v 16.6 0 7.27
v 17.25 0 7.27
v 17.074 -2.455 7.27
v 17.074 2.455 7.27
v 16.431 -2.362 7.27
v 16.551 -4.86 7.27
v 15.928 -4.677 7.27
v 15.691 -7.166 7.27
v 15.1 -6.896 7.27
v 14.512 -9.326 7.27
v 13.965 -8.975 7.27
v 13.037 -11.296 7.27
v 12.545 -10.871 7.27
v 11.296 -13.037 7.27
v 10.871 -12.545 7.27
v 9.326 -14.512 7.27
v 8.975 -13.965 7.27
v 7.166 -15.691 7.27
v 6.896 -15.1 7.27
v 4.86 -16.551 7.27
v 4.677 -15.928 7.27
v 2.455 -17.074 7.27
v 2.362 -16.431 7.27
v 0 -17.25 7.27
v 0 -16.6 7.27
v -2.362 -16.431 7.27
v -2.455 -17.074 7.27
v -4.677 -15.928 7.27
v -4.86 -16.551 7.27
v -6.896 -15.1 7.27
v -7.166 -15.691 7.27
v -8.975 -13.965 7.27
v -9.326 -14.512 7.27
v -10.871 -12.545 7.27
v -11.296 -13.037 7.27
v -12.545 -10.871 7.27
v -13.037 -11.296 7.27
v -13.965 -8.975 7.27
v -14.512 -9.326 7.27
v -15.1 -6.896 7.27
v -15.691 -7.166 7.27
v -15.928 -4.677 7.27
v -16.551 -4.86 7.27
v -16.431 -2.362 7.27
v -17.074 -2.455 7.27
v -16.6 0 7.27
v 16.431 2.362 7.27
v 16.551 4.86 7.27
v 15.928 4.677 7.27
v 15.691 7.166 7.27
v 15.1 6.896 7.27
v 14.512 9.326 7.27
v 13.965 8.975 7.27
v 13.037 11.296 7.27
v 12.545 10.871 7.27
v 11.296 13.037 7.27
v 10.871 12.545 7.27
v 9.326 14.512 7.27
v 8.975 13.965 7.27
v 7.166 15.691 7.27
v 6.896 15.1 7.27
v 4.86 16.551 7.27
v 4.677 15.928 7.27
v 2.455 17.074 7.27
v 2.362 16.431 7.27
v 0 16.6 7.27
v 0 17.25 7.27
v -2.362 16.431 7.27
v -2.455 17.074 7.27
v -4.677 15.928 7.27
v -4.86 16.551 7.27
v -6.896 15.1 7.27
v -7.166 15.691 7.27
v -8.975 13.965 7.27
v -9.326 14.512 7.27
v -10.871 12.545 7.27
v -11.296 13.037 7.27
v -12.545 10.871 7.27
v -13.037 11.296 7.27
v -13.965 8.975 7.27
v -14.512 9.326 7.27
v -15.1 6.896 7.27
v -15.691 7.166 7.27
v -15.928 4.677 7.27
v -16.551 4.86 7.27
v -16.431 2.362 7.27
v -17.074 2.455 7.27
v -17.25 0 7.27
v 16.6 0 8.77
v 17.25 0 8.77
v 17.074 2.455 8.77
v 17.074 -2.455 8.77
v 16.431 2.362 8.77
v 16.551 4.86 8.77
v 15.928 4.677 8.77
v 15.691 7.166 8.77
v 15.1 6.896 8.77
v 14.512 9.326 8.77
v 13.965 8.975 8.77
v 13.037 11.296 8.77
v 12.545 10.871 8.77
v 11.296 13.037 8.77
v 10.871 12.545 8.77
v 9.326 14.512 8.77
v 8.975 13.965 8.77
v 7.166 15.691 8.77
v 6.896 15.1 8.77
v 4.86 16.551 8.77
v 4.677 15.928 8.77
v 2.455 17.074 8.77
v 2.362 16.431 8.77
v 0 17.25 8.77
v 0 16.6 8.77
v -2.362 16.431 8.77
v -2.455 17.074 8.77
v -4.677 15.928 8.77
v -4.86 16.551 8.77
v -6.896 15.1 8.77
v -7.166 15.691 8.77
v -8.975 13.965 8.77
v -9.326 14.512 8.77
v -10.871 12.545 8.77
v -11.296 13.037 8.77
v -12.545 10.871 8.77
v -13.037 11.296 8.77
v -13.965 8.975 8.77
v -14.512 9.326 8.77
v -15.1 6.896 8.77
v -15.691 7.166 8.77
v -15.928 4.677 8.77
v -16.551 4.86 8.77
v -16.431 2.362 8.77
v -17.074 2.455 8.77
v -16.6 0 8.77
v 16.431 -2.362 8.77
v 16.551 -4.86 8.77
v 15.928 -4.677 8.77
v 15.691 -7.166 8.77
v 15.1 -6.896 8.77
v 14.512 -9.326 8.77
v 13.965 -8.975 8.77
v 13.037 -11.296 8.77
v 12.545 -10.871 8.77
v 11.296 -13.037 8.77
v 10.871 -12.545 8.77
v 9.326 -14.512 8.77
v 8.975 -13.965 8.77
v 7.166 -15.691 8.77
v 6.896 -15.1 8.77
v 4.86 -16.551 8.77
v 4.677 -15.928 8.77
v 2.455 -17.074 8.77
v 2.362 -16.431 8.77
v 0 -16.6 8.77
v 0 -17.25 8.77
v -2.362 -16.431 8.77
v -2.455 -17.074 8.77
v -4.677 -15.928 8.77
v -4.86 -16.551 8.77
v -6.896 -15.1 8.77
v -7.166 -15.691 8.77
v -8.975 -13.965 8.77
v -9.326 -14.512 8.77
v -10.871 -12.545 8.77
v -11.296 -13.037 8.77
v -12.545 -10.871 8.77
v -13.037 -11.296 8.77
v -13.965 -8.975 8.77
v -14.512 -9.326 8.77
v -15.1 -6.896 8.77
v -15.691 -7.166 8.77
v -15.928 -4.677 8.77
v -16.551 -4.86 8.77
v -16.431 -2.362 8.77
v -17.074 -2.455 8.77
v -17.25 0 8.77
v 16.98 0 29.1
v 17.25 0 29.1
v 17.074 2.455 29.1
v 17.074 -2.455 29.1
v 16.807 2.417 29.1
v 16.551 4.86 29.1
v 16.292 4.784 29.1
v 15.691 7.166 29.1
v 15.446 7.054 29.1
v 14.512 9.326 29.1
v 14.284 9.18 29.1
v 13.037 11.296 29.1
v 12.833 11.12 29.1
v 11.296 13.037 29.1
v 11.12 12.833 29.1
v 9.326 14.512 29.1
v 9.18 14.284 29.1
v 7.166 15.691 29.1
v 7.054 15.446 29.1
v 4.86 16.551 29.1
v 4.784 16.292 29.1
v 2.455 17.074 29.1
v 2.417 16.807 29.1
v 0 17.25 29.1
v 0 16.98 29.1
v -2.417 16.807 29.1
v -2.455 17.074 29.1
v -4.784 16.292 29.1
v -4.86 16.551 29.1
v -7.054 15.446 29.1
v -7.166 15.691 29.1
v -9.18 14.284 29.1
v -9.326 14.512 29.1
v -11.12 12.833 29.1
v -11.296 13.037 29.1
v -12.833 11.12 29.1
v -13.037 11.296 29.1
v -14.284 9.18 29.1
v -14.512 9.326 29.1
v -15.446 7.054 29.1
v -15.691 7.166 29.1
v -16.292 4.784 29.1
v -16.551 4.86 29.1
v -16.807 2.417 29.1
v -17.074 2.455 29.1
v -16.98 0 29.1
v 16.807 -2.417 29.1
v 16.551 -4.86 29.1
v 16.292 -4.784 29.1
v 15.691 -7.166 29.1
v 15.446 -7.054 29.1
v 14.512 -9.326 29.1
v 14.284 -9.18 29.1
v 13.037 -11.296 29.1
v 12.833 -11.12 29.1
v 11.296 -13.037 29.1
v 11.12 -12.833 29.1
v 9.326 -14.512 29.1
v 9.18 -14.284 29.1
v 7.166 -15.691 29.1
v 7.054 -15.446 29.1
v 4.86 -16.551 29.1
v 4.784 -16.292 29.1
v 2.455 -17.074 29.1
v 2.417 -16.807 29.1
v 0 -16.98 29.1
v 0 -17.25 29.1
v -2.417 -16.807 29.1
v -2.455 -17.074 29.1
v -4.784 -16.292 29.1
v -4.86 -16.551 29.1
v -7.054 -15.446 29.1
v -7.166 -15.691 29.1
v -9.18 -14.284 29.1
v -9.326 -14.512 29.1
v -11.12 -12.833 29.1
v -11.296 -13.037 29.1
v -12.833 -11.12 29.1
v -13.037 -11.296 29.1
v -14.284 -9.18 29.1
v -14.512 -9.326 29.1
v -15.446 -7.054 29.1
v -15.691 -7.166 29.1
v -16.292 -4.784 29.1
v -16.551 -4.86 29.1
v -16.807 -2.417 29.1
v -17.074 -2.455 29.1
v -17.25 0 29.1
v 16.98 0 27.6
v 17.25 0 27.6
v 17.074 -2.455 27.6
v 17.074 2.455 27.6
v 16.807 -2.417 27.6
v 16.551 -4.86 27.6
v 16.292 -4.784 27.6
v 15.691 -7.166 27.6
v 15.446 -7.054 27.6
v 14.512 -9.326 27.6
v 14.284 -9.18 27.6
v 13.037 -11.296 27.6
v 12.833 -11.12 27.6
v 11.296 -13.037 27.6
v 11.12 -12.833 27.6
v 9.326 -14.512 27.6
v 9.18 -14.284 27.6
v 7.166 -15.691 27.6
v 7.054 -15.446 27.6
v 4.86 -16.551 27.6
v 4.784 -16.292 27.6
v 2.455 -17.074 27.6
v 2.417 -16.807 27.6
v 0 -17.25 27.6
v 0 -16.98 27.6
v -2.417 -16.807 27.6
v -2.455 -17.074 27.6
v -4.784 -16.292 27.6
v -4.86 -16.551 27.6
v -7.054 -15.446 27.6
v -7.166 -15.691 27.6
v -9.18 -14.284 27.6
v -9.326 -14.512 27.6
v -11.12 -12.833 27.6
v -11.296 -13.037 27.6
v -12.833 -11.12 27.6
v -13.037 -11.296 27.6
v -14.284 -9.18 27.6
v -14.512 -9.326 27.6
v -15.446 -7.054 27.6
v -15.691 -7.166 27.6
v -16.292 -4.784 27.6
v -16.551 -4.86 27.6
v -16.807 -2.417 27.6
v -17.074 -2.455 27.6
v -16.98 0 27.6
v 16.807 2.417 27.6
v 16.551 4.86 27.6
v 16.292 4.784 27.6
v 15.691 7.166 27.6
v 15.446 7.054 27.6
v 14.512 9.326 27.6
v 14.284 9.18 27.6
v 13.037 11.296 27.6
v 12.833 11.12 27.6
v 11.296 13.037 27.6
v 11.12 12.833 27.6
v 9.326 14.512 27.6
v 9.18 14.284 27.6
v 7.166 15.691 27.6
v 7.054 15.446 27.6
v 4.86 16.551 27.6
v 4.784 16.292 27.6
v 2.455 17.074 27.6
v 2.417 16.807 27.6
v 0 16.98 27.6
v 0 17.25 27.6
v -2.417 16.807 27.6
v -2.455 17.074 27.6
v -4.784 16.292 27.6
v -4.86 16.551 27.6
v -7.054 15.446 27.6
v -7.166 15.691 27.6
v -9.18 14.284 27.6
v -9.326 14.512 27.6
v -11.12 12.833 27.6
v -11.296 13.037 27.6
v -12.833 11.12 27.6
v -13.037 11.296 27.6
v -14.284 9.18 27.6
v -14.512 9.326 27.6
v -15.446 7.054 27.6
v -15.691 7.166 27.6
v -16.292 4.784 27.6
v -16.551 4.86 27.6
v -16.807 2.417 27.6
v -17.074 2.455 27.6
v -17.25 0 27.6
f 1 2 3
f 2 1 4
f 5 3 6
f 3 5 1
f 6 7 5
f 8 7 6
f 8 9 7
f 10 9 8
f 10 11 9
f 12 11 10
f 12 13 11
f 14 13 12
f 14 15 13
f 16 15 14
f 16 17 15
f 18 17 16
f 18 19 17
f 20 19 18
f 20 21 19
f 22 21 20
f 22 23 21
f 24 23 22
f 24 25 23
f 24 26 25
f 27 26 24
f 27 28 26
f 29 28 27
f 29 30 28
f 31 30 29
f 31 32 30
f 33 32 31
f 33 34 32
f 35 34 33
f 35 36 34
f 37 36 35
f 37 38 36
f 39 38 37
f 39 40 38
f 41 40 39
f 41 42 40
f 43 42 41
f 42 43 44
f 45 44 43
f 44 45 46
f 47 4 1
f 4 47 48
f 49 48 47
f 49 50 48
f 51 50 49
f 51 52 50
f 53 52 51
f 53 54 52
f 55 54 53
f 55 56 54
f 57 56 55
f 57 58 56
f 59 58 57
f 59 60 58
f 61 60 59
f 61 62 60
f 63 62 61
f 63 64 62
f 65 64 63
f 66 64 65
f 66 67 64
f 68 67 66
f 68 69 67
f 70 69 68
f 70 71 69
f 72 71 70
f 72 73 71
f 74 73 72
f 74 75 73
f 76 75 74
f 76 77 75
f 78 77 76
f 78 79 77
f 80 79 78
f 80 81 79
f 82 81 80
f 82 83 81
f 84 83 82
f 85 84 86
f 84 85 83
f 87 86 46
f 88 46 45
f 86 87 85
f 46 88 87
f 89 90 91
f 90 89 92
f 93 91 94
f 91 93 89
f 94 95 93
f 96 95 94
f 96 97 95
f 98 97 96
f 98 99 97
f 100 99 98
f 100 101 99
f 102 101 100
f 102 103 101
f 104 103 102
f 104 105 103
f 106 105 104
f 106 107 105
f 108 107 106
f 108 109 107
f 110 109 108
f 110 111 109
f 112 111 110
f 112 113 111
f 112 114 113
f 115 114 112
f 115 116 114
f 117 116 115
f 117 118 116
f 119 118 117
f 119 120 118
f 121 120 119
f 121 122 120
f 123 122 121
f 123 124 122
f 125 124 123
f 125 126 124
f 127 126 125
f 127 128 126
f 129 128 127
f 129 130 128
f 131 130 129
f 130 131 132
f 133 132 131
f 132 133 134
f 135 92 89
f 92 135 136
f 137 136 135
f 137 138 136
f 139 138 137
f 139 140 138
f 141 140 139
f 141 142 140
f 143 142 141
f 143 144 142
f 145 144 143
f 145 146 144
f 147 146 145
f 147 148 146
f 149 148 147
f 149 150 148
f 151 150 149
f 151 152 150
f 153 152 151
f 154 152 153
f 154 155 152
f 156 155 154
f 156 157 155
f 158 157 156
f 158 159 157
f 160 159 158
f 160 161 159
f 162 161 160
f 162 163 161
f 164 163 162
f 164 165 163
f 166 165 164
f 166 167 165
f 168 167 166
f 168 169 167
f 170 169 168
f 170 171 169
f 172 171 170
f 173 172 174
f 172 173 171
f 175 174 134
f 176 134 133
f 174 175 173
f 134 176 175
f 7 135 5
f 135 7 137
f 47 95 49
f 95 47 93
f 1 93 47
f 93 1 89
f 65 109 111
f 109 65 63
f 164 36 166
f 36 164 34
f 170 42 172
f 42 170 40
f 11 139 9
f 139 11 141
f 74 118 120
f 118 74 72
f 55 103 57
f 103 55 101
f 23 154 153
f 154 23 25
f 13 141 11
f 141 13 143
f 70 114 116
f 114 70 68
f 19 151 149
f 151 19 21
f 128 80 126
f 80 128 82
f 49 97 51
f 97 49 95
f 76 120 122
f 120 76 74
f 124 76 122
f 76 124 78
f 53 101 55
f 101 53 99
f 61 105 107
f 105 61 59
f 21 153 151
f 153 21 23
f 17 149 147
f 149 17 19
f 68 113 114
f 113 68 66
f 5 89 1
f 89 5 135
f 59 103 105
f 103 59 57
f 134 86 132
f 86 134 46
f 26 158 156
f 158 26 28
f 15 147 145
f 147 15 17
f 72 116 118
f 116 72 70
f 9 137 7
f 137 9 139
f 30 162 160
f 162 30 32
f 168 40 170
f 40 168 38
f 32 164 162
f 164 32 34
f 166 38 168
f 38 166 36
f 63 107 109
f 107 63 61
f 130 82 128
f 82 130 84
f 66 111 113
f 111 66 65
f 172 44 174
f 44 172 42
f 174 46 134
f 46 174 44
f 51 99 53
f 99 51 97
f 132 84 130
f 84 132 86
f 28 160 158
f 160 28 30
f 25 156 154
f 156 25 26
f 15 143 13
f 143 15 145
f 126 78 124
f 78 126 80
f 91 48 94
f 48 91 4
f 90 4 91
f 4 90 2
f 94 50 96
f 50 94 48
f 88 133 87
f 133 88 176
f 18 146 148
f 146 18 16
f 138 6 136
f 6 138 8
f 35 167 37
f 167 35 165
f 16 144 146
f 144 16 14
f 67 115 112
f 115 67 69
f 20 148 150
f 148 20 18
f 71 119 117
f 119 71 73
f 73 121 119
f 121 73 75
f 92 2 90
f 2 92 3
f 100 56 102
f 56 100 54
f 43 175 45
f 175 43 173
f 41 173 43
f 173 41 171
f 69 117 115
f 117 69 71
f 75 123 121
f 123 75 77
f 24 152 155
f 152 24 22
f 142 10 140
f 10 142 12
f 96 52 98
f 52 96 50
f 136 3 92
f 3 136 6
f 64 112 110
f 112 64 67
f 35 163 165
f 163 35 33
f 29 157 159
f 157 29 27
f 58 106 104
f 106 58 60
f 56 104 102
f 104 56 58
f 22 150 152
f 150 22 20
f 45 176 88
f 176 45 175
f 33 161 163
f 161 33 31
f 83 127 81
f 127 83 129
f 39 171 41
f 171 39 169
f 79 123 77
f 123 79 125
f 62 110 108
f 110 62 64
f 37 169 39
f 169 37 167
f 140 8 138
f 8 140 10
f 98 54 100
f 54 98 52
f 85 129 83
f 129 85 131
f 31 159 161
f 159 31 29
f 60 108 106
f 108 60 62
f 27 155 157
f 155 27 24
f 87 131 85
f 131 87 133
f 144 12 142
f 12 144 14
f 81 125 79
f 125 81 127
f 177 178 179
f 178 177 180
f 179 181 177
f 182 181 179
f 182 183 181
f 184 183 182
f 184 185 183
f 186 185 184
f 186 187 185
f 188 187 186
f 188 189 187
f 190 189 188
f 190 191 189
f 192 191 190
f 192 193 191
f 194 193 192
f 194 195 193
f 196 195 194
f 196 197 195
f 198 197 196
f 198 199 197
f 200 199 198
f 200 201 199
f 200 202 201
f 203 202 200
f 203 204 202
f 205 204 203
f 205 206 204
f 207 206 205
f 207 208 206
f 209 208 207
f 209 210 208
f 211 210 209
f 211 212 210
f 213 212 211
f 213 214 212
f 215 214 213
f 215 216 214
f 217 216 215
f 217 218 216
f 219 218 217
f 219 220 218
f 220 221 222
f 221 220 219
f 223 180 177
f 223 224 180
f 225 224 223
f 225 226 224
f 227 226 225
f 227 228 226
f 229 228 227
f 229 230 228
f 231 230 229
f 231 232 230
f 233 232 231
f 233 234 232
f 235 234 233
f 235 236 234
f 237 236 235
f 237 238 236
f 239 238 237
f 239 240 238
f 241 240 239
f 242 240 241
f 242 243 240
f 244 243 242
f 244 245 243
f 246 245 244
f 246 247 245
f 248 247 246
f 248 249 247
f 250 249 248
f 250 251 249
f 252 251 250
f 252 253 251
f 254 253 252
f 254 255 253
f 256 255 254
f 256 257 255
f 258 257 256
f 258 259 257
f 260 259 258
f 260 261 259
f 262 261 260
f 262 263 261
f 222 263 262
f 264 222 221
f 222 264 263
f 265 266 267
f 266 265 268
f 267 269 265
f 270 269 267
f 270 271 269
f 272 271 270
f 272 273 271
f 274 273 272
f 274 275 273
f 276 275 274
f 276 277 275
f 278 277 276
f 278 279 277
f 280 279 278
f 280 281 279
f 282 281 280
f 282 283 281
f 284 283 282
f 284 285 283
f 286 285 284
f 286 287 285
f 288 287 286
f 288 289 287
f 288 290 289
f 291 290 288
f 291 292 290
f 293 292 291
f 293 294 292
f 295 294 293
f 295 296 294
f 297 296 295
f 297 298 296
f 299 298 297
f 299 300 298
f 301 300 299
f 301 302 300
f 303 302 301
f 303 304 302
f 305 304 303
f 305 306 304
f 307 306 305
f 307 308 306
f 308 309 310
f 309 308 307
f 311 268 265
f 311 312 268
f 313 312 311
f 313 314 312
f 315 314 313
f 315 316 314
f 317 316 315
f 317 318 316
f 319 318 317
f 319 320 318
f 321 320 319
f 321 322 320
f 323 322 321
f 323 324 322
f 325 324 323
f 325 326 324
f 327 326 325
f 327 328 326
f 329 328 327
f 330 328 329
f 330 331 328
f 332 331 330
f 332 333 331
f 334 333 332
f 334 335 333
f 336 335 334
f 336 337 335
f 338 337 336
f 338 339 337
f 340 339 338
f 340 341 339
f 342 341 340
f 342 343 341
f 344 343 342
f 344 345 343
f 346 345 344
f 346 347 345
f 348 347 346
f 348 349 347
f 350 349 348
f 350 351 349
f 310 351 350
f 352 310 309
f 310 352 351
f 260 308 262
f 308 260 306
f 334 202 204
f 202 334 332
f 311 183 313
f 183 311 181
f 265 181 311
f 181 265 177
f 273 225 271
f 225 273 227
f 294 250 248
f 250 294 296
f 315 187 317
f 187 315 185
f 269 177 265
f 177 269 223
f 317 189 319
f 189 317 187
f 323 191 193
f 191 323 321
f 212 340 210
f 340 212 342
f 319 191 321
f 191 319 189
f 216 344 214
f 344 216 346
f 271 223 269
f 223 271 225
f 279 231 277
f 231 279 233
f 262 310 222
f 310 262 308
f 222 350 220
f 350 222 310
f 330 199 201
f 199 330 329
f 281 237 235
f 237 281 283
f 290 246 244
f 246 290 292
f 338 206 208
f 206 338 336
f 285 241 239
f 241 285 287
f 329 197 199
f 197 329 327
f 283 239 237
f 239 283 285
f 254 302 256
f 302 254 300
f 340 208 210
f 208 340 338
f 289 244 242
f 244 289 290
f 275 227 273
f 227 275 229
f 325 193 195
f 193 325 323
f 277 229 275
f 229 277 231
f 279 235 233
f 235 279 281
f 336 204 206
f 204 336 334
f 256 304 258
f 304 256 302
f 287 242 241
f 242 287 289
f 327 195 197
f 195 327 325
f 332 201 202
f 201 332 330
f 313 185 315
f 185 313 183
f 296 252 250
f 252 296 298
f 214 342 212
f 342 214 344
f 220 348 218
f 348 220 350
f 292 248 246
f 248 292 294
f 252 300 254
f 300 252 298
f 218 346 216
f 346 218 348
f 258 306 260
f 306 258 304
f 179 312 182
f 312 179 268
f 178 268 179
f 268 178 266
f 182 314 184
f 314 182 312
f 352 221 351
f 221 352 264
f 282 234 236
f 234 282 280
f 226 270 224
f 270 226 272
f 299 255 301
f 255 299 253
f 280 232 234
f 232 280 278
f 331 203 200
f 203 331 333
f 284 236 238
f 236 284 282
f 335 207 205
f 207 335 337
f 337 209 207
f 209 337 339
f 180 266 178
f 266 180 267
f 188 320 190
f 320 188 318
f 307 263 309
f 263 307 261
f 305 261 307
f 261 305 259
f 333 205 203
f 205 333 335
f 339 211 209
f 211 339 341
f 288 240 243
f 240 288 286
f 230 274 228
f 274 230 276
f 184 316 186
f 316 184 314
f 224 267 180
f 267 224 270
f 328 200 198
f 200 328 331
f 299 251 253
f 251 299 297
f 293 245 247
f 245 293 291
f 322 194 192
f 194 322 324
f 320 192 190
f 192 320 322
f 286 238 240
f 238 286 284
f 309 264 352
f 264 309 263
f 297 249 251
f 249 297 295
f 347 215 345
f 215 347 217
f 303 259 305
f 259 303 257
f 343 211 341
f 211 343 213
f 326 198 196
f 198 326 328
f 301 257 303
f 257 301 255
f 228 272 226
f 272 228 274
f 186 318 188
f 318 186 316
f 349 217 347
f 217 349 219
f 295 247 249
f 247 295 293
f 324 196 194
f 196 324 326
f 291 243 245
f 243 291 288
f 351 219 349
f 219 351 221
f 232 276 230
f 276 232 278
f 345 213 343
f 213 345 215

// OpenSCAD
// Djed 4 parties

version = 1;
height = 36;
paroi = 1.5;
$fn=44;

// djed_creux();
// translate([0,0,-2])
// djed_base();
translate([0,0,-2])
ailette();
ailette2();

module ailette2() {
    d = 27.6;
    difference() {
        union() {
            djed_creux();
            translate([0,0,d])
                renfort(0.98);
        }
        translate([0,0,d])
            #decoupe(0.5);
        ailette(0.2);
    }
}

module ailette(offset=0) {
    d = 9.27;
    difference() {
        union() {
            djed_creux();
            translate([0,0,d])
                renfort(0.6+offset);
        }
        translate([0,0,d])
            decoupe(0.5+offset);
        // djed_base();
    }
}

module djed_base() {
    difference() {
        union() {
            djed_creux();
            translate([0,0,-9.05])
                renfort();
        }
        translate([0,0,-9.05]) decoupe();
    }
}

module renfort(offset=0) {
    difference() {
        cylinder(h=paroi, r=35/2-paroi/2+offset, center=false);
        translate([0,0,-0.01])
        cylinder(h=paroi+0.1, r=35/2-paroi+offset, center=false);
    }
}

module decoupe(offset=0) {
    difference() {
        cylinder(h=666, r=666, center=false, $fn=12);
        cylinder(h=2, r=35/2-paroi/2+offset, center=false);
    }
}

module djed_creux(angle=36, fn=20) {
    difference() {
        rotate_extrude(angle=angle, convexity = 10)
            // translate([0,0])
            difference() {
                sketch();
                // r: rounded, delta: straight
                offset(r=-paroi, $fn=fn, chamfer=false) {
                    sketch();
                }
            }
        translate([0,0,-15])
        cylinder(r=paroi*paroi, h=160-2*paroi, center=true);
    }
}

// sketch();
module sketch() {
    import(file = "../Djed_v2.dxf");
}
